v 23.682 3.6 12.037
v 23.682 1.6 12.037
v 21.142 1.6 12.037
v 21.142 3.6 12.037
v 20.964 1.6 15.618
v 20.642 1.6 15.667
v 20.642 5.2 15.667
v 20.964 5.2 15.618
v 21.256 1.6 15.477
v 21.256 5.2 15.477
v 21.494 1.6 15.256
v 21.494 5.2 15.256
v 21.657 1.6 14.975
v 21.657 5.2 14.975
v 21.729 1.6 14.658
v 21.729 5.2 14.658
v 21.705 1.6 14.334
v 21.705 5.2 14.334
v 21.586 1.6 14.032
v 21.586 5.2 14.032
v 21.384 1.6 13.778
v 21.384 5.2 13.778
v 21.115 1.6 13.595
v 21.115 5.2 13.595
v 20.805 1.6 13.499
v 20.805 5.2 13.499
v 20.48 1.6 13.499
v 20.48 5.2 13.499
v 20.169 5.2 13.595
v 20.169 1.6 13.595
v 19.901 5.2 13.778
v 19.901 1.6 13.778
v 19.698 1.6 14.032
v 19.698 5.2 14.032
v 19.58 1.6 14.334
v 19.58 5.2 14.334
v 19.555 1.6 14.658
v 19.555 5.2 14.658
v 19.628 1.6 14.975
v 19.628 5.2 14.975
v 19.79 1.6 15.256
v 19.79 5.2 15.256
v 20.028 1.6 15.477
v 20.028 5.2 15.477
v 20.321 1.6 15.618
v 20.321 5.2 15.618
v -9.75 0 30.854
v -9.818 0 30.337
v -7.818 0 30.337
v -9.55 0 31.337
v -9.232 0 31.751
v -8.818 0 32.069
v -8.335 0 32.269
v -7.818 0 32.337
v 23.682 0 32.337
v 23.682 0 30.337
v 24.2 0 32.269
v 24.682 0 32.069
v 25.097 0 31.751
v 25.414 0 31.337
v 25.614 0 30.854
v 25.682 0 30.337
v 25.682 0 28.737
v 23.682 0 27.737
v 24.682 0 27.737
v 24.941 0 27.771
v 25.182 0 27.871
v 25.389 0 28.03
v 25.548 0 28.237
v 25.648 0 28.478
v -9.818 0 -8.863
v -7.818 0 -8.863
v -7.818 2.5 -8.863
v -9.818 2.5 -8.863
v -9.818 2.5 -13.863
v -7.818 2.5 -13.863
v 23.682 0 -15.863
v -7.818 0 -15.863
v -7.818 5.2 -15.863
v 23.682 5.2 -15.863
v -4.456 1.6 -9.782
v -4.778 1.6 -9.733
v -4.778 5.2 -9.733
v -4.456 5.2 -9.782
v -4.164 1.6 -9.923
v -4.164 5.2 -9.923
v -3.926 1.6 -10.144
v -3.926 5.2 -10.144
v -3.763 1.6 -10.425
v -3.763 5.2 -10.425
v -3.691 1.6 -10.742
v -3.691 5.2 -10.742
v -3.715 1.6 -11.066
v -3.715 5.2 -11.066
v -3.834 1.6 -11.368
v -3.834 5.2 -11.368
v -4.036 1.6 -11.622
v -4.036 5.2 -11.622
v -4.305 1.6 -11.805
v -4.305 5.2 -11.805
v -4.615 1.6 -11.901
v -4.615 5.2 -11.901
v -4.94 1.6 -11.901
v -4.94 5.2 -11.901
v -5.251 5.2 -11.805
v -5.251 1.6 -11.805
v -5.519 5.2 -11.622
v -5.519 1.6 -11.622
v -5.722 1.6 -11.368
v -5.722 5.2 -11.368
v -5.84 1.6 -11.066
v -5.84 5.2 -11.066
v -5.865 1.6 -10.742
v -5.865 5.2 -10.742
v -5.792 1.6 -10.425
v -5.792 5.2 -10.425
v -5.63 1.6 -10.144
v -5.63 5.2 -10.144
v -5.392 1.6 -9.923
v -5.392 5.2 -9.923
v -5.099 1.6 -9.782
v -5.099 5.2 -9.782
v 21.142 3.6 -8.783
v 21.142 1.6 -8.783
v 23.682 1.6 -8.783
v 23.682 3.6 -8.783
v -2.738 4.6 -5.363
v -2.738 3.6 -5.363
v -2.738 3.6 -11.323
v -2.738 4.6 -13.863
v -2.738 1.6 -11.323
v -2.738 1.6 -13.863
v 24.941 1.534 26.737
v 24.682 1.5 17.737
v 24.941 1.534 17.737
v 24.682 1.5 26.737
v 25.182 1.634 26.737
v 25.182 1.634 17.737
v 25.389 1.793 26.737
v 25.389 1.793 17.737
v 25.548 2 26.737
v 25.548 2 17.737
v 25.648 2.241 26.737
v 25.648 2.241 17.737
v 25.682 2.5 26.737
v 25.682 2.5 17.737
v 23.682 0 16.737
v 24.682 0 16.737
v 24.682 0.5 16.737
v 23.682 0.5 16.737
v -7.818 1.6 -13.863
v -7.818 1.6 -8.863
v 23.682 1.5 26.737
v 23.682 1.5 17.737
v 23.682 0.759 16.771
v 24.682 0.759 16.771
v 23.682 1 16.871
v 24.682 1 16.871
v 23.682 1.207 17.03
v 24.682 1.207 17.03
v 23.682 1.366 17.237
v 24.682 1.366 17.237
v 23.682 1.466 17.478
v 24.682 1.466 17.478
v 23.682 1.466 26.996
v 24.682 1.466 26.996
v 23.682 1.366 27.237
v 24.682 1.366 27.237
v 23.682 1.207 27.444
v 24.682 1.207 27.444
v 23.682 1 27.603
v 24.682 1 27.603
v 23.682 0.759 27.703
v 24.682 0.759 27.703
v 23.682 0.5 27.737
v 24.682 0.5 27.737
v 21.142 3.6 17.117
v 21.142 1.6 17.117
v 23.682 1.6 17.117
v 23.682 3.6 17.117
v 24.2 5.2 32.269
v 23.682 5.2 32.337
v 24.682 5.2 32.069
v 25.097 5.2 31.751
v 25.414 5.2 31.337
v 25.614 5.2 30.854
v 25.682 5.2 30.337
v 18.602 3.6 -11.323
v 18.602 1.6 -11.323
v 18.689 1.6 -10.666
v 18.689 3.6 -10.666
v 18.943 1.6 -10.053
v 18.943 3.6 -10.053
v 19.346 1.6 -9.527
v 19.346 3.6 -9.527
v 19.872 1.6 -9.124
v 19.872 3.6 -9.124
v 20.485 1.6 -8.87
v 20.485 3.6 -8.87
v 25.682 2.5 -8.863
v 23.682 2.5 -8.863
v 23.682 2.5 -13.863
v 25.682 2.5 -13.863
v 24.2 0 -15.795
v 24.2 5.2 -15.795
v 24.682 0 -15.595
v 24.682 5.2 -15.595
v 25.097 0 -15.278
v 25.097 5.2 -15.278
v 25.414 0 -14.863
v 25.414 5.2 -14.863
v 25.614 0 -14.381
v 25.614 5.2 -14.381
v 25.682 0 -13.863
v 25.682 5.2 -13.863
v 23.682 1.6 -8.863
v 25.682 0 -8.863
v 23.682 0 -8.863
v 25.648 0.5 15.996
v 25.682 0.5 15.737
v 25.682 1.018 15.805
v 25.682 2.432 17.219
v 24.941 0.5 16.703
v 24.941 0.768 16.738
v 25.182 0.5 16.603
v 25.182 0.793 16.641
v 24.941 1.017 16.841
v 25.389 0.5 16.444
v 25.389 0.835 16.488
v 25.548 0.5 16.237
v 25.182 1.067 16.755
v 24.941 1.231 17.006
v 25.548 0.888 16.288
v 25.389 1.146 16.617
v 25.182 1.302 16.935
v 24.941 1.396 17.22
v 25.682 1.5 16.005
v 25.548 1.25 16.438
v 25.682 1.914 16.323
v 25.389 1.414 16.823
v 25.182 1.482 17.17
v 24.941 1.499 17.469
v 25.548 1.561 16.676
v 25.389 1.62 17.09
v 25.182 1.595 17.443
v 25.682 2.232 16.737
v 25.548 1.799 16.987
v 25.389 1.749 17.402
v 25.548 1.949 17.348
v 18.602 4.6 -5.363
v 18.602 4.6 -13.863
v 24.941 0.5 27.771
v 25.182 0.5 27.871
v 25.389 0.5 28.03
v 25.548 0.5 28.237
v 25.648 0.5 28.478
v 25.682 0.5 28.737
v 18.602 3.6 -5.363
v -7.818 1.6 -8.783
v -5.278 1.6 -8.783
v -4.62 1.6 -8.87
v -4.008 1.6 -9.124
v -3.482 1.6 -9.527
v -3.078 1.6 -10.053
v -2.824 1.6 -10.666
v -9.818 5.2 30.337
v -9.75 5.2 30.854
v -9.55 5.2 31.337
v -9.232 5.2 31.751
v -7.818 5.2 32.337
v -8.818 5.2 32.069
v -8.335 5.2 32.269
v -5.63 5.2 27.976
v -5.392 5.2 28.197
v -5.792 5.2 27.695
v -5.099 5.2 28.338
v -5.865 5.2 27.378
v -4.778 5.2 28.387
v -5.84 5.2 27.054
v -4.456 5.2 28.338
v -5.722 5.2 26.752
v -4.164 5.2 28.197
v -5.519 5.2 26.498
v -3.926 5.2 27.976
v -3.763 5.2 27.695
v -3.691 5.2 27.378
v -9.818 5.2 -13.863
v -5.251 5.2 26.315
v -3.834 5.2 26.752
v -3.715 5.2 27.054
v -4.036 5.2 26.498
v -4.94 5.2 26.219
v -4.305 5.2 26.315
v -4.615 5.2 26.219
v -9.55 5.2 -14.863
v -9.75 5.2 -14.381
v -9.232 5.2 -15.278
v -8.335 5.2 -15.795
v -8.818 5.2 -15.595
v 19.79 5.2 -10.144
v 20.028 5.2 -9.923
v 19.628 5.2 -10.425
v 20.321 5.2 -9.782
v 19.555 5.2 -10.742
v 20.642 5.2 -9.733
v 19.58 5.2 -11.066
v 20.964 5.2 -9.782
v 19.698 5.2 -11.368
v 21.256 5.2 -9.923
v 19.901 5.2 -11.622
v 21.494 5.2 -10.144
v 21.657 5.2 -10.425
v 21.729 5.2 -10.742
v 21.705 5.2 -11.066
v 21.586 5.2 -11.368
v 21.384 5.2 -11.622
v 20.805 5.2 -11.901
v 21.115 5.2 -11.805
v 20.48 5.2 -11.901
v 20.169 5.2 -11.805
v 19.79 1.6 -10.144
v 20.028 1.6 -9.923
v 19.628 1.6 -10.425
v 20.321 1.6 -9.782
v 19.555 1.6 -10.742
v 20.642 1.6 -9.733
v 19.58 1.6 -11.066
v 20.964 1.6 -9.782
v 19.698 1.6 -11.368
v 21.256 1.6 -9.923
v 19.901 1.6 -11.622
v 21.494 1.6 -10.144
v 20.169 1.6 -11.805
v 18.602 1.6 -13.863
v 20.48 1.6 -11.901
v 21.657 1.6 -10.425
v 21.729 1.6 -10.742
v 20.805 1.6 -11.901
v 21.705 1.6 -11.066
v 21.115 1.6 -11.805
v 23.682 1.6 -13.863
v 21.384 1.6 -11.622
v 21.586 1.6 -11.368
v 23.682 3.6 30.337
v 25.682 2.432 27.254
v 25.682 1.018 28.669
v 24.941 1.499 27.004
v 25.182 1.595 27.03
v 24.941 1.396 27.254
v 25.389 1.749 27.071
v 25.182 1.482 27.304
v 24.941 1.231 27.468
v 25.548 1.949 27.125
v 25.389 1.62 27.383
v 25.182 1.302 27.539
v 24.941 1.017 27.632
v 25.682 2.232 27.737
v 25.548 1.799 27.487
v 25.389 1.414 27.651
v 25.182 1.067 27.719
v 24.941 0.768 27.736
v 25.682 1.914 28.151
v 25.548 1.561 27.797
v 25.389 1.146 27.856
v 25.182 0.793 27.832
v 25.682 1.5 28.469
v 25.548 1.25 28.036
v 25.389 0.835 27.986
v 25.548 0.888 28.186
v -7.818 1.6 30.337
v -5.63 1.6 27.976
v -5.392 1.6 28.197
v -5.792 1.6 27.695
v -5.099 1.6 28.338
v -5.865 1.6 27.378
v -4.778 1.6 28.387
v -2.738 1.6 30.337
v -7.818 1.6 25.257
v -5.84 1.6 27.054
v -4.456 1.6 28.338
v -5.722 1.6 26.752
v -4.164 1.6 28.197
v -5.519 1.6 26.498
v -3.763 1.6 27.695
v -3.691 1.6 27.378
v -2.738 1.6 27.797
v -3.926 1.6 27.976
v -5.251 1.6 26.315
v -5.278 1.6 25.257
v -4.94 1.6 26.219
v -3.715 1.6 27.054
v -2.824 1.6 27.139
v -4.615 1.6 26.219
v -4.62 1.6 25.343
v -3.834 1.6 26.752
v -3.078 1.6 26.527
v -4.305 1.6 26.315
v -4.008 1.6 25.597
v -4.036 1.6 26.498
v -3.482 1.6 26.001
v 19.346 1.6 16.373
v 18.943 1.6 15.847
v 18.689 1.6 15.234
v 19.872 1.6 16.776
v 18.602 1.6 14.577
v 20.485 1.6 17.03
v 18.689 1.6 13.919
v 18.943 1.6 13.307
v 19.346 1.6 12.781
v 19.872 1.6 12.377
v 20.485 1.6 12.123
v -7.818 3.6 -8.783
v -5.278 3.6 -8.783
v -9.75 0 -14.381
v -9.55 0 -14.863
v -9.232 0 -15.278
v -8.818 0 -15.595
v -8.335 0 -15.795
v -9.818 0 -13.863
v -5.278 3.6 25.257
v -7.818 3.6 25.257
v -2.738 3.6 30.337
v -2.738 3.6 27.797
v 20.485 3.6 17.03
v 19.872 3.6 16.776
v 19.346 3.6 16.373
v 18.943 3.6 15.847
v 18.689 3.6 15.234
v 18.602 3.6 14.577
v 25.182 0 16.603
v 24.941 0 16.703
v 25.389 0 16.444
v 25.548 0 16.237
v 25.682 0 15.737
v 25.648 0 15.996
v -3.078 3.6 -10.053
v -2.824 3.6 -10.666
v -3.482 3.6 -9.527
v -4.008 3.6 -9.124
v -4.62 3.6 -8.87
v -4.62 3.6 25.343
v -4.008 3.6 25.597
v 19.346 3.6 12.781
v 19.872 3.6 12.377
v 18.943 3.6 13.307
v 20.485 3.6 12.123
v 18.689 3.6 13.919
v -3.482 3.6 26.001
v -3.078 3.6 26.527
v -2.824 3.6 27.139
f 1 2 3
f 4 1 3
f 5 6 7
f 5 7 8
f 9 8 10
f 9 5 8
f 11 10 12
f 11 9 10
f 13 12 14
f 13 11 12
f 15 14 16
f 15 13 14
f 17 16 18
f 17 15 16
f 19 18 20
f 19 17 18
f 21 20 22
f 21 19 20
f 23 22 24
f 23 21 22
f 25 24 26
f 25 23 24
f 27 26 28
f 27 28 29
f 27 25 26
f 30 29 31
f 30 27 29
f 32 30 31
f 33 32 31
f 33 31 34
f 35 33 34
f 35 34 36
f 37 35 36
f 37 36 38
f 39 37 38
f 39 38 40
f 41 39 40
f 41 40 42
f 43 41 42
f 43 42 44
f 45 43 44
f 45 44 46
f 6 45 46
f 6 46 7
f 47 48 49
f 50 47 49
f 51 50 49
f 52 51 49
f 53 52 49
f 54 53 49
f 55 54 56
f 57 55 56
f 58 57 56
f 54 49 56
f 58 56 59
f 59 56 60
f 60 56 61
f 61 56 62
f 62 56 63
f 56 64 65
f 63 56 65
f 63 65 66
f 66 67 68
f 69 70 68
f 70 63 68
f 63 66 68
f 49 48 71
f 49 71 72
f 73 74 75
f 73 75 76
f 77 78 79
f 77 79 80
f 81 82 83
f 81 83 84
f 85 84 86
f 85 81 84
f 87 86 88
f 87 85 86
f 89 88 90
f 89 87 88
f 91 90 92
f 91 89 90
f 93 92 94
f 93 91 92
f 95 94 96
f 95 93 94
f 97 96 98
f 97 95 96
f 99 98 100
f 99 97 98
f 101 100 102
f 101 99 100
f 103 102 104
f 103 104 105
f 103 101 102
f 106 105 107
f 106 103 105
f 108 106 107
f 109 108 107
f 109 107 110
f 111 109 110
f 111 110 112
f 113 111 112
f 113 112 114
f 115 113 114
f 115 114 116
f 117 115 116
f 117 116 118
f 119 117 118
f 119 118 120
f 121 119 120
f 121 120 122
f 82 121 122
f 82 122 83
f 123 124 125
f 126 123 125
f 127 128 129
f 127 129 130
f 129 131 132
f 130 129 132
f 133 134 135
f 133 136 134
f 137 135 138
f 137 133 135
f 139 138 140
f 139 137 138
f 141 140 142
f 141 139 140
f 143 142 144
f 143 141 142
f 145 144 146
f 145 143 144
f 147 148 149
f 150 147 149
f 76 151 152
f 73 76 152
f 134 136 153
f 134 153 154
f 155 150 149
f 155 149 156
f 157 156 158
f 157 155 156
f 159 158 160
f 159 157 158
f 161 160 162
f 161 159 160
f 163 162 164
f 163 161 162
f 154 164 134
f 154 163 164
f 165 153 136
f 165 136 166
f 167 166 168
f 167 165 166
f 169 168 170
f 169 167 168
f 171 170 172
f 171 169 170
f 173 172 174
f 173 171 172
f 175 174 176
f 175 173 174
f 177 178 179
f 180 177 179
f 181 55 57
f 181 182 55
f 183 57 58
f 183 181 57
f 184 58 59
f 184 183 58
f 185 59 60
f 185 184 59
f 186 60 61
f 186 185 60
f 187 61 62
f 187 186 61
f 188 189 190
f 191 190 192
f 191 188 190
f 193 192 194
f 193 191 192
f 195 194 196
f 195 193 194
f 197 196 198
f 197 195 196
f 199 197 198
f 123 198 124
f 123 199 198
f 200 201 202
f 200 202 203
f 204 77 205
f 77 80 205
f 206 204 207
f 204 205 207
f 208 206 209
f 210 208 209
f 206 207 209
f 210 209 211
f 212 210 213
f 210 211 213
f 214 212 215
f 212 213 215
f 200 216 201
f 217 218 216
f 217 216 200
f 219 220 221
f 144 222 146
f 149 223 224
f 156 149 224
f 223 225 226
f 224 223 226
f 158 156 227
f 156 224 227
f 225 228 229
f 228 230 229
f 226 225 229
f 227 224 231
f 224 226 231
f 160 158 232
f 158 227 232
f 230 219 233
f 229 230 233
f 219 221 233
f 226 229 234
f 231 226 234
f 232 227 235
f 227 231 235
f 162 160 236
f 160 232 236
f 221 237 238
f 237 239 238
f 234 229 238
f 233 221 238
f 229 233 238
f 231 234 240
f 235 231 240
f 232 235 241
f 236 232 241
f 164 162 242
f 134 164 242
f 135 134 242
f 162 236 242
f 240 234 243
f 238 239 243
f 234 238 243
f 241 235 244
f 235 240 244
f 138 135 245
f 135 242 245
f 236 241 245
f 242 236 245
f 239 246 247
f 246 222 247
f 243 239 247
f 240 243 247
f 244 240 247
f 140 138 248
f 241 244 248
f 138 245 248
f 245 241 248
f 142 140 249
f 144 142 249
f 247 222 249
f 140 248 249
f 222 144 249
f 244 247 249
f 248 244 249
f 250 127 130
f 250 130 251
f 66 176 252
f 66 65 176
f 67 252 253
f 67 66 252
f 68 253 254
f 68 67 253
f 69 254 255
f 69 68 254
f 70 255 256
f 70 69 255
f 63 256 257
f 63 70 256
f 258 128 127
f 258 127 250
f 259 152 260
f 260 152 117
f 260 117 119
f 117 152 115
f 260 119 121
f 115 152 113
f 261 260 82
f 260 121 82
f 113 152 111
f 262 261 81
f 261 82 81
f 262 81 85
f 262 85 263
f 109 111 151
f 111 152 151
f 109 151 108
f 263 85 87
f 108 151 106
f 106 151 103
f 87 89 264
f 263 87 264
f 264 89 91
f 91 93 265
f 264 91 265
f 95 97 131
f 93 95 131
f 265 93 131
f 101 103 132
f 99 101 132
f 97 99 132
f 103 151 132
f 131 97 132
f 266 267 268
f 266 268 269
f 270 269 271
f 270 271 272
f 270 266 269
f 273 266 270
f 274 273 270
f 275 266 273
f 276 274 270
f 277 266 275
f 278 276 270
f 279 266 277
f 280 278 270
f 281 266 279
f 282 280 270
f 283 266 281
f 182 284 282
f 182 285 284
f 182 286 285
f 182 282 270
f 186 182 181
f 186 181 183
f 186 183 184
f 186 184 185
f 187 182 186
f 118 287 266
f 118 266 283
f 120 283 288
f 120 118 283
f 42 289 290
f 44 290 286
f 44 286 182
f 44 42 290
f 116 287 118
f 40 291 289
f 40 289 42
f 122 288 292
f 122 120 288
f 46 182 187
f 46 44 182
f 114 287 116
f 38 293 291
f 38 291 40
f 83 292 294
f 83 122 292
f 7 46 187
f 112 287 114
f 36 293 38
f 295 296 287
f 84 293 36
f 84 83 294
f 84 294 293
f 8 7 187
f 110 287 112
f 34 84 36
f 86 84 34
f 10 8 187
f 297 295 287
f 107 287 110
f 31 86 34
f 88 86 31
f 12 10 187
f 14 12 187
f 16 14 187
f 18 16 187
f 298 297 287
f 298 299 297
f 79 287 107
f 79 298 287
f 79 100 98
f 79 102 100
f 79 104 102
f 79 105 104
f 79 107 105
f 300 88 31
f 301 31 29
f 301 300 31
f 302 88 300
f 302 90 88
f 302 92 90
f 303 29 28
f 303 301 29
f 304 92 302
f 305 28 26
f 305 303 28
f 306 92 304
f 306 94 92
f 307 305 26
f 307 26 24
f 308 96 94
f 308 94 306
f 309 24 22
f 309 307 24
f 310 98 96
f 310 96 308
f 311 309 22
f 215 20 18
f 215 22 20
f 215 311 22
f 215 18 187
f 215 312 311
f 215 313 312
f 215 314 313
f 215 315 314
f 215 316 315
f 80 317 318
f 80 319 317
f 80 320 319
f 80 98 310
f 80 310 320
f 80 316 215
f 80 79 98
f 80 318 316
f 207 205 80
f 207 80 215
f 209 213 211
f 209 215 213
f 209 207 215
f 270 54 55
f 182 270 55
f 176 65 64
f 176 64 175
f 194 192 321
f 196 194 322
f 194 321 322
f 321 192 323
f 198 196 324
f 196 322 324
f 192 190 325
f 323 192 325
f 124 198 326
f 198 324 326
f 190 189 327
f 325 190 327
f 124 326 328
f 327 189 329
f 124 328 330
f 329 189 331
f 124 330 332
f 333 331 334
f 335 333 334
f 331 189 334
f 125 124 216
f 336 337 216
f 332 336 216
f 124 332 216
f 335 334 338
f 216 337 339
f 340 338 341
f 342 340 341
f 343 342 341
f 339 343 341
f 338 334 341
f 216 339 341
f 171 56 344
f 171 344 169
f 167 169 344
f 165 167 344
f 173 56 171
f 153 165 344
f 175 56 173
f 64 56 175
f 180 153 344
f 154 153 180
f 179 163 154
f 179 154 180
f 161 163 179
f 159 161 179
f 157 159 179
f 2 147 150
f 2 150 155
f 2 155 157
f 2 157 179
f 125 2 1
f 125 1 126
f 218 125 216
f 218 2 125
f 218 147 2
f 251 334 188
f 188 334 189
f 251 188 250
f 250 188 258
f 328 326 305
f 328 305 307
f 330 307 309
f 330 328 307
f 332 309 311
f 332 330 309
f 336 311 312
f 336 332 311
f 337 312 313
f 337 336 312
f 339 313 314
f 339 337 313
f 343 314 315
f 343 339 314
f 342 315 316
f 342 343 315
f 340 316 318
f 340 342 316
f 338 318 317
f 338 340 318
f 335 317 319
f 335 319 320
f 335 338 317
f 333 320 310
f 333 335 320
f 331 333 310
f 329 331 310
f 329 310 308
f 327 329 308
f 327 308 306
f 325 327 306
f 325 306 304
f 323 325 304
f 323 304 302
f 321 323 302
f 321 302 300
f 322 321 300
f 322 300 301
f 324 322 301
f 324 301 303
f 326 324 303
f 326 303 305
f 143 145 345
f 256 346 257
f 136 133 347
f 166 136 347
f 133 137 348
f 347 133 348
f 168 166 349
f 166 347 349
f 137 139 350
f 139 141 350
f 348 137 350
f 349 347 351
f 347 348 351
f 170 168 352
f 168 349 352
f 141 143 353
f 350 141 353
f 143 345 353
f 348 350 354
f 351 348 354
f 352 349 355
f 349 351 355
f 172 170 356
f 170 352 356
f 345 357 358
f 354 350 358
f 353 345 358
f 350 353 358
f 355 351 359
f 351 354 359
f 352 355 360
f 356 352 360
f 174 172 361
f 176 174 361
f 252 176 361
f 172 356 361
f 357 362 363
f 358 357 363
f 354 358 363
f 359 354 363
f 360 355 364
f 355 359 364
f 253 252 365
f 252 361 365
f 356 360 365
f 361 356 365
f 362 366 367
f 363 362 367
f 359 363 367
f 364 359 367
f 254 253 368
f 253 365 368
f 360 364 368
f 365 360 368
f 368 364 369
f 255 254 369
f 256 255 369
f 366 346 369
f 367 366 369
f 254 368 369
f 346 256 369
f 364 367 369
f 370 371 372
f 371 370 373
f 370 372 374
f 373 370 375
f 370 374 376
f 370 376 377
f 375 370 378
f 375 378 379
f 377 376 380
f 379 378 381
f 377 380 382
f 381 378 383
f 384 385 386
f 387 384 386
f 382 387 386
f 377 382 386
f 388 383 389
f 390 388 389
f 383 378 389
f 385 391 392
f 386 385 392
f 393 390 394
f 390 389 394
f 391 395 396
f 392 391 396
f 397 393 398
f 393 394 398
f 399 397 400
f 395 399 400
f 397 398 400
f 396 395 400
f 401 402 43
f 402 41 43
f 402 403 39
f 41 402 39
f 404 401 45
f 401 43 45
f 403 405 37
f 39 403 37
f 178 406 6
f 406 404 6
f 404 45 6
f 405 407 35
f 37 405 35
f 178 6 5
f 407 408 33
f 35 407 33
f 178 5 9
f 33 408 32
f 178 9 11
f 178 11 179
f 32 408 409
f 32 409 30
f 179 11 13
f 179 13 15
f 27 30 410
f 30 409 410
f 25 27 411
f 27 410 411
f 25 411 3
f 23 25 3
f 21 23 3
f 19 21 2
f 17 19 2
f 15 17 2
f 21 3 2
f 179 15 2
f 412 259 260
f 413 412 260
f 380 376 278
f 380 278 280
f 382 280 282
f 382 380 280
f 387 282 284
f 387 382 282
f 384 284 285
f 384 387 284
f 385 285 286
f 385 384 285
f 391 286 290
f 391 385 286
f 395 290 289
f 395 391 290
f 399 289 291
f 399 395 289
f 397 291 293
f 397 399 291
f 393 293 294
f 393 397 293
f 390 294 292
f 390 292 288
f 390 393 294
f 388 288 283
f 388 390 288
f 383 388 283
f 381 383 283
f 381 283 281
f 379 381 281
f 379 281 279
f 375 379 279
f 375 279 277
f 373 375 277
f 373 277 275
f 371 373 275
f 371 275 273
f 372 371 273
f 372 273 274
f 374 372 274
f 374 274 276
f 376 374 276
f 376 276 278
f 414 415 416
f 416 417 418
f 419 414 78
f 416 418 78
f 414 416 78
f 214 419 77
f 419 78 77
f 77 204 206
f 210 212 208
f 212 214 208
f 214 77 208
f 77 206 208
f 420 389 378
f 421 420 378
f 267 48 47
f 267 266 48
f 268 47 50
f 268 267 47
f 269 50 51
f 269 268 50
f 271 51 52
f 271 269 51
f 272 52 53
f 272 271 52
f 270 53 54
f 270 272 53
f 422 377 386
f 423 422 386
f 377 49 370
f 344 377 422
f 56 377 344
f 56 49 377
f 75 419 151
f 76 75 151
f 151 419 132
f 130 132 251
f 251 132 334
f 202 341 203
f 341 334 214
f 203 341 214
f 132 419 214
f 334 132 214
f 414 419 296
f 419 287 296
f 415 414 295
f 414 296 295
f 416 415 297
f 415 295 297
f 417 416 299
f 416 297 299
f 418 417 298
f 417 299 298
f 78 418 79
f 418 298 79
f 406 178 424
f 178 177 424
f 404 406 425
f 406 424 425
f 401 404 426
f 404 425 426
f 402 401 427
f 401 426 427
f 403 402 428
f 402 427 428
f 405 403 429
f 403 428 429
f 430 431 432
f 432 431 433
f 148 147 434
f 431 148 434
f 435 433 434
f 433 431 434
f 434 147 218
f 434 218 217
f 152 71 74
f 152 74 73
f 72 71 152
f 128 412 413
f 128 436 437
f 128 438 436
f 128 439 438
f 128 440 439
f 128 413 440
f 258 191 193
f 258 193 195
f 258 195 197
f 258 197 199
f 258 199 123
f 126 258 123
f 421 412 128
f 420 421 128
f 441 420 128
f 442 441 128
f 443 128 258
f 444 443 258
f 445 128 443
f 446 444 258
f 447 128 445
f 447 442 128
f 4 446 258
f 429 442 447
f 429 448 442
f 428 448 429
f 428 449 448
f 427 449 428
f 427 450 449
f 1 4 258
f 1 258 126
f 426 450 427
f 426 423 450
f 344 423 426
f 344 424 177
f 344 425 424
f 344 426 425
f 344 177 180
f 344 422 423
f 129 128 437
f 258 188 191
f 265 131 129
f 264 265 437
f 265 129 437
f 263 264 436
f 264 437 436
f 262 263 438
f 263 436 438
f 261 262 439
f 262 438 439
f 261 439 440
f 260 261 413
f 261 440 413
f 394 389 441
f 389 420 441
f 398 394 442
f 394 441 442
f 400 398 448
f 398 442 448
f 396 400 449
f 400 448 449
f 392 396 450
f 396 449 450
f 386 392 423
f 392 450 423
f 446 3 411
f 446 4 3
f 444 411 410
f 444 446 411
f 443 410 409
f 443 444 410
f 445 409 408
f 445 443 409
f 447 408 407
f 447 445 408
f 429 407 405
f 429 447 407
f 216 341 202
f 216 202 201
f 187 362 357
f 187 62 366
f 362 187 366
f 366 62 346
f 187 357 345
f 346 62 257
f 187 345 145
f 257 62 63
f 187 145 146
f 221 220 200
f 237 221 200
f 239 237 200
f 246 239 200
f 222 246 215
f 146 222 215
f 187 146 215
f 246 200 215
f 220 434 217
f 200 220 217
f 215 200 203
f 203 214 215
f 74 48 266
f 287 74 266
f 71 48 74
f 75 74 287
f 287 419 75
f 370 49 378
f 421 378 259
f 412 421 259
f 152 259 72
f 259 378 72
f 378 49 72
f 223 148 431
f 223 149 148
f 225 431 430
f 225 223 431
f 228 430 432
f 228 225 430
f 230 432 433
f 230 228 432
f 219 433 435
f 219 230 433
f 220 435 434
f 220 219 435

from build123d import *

# Parameters (mm, degrees)
SKETCH1_W           = 35.5
SKETCH1_H           = 48.2
SKETCH1_R           = 1.09
BOSS_EXTRUDE2_DEPTH = 5.2
SKETCH1_4_W         = 31.5
SKETCH1_4_H         = 44.2
CUT_EXTRUDE1_DEPTH  = 1.6
CUT_EXTRUDE2_DEPTH  = 2
SKETCH6_W           = 21.34
SKETCH6_H           = 8.5
CUT_EXTRUDE5_DEPTH  = 1
SKETCH4_W           = 2
SKETCH4_H           = 5
CUT_EXTRUDE3_DEPTH  = 2.5
SKETCH5_W           = 11
SKETCH5_H           = 1.5
CUT_EXTRUDE4_DEPTH  = 2
FILLET1_R           = 2
FILLET3_R           = 2.54
FILLET4_R           = 1
FILLET2_R           = 1


with BuildPart() as part:
    # Sketch1 → Boss-Extrude2 (new body)
    with BuildSketch(Plane(origin=(0, 0, 0), x_dir=(1, 0, 0), z_dir=(0, 1, 0))):
        with Locations((7.932292683, -8.236727254)):
            Rectangle(SKETCH1_W, SKETCH1_H)
        with Locations(Location((20.642292683, 10.823272746, 0), (0, 0, 270))):
            Circle(SKETCH1_R, mode=Mode.SUBTRACT)
        with Locations(Location((-4.777707317, 10.823272746, 0), (0, 0, 270))):
            Circle(SKETCH1_R, mode=Mode.SUBTRACT)
        with Locations(Location((-4.777707317, -27.296727254, 0), (0, 0, 270))):
            Circle(SKETCH1_R, mode=Mode.SUBTRACT)
        with Locations(Location((20.642292683, -14.576727254, 0), (0, 0, 270))):
            Circle(SKETCH1_R, mode=Mode.SUBTRACT)
    extrude(amount=BOSS_EXTRUDE2_DEPTH)

    # Sketch1<4> → Cut-Extrude1 (cut)
    with BuildSketch(Plane(origin=(0, 0, 0), x_dir=(1, 0, 0), z_dir=(0, 1, 0))):
        with Locations((7.932292683, -8.236727254)):
            Rectangle(SKETCH1_4_W, SKETCH1_4_H)
    extrude(amount=CUT_EXTRUDE1_DEPTH, mode=Mode.SUBTRACT)

    # Sketch3 → Cut-Extrude2 (cut)
    with BuildSketch(Plane.XZ.offset(-1.6)):
        Polygon((-2.737707317, -13.863272746), (18.602292683, -13.863272746), (18.602292683, -8.783272746), (23.682292683, -8.783272746), (23.682292683, 12.036727254), (18.602292683, 12.036727254), (18.602292683, 17.116727254), (23.682292683, 17.116727254), (23.682292683, 30.336727254), (-2.737707317, 30.336727254), (-2.737707317, 25.256727254), (-7.817707317, 25.256727254), (-7.817707317, -8.783272746), (-2.737707317, -8.783272746), align=None)
    extrude(amount=-CUT_EXTRUDE2_DEPTH, mode=Mode.SUBTRACT)

    # Sketch6 → Cut-Extrude5 (cut)
    with BuildSketch(Plane.XZ.offset(-3.6)):
        with Locations((7.932292683, -9.613272746)):
            Rectangle(SKETCH6_W, SKETCH6_H)
    extrude(amount=-CUT_EXTRUDE5_DEPTH, mode=Mode.SUBTRACT)

    # Sketch4 → Cut-Extrude3 (cut)
    with BuildSketch(Plane.XZ):
        with Locations((24.682292683, -11.363272746)):
            Rectangle(SKETCH4_W, SKETCH4_H)
        with Locations((-8.817707317, -11.363272746)):
            Rectangle(SKETCH4_W, SKETCH4_H)
    extrude(amount=-CUT_EXTRUDE3_DEPTH, mode=Mode.SUBTRACT)

    # Sketch5 → Cut-Extrude4 (cut)
    with BuildSketch(Plane(origin=(25.682292683, 0, 0), x_dir=(0, 0, -1), z_dir=(1, 0, 0))):
        with Locations((-22.236727254, 0.75)):
            Rectangle(SKETCH5_W, SKETCH5_H)
    extrude(amount=-CUT_EXTRUDE4_DEPTH, mode=Mode.SUBTRACT)

    # Fillet1
    fillet1_edges = [part.edges().sort_by_distance(p)[0] for p in [
        (-9.817707317, 2.6, -15.863272746),
        (25.682292683, 2.6, -15.863272746),
        (25.682292683, 2.6, 32.336727254),
        (-9.817707317, 2.6, 32.336727254),
    ]]
    fillet(fillet1_edges, radius=FILLET1_R - 0.0001)  # a hair under: the kernel refuses the full size

    # Fillet3
    fillet3_edges = [part.edges().sort_by_distance(p)[0] for p in [
        (-2.737707317, 2.6, 25.256727254),
        (18.602292683, 2.6, 17.116727254),
        (18.602292683, 2.6, 12.036727254),
        (18.602292683, 2.6, -8.783272746),
        (-2.737707317, 2.6, -8.783272746),
    ]]
    fillet(fillet3_edges, radius=FILLET3_R - 0.0001)  # a hair under: the kernel refuses the full size

    # Fillet4
    fillet4_edges = [part.edges().sort_by_distance(p)[0] for p in [
        (24.682292683, 1.5, 27.736727254),
        (24.682292683, 1.5, 16.736727254),
    ]]
    fillet(fillet4_edges, radius=FILLET4_R)

    # Fillet2
    fillet2_edges = [part.edges().sort_by_distance(p)[0] for p in [
        (25.682292683, 0.25, 16.736727254),
        (25.682292683, 0.25, 27.736727254),
        (25.682292683, 1.5, 22.236727254),
        (25.682292683, 1.207106781, 27.443834036),
        (25.682292683, 1.207106781, 17.029620473),
    ]]
    fillet(fillet2_edges, radius=FILLET2_R)


solid = part.part
